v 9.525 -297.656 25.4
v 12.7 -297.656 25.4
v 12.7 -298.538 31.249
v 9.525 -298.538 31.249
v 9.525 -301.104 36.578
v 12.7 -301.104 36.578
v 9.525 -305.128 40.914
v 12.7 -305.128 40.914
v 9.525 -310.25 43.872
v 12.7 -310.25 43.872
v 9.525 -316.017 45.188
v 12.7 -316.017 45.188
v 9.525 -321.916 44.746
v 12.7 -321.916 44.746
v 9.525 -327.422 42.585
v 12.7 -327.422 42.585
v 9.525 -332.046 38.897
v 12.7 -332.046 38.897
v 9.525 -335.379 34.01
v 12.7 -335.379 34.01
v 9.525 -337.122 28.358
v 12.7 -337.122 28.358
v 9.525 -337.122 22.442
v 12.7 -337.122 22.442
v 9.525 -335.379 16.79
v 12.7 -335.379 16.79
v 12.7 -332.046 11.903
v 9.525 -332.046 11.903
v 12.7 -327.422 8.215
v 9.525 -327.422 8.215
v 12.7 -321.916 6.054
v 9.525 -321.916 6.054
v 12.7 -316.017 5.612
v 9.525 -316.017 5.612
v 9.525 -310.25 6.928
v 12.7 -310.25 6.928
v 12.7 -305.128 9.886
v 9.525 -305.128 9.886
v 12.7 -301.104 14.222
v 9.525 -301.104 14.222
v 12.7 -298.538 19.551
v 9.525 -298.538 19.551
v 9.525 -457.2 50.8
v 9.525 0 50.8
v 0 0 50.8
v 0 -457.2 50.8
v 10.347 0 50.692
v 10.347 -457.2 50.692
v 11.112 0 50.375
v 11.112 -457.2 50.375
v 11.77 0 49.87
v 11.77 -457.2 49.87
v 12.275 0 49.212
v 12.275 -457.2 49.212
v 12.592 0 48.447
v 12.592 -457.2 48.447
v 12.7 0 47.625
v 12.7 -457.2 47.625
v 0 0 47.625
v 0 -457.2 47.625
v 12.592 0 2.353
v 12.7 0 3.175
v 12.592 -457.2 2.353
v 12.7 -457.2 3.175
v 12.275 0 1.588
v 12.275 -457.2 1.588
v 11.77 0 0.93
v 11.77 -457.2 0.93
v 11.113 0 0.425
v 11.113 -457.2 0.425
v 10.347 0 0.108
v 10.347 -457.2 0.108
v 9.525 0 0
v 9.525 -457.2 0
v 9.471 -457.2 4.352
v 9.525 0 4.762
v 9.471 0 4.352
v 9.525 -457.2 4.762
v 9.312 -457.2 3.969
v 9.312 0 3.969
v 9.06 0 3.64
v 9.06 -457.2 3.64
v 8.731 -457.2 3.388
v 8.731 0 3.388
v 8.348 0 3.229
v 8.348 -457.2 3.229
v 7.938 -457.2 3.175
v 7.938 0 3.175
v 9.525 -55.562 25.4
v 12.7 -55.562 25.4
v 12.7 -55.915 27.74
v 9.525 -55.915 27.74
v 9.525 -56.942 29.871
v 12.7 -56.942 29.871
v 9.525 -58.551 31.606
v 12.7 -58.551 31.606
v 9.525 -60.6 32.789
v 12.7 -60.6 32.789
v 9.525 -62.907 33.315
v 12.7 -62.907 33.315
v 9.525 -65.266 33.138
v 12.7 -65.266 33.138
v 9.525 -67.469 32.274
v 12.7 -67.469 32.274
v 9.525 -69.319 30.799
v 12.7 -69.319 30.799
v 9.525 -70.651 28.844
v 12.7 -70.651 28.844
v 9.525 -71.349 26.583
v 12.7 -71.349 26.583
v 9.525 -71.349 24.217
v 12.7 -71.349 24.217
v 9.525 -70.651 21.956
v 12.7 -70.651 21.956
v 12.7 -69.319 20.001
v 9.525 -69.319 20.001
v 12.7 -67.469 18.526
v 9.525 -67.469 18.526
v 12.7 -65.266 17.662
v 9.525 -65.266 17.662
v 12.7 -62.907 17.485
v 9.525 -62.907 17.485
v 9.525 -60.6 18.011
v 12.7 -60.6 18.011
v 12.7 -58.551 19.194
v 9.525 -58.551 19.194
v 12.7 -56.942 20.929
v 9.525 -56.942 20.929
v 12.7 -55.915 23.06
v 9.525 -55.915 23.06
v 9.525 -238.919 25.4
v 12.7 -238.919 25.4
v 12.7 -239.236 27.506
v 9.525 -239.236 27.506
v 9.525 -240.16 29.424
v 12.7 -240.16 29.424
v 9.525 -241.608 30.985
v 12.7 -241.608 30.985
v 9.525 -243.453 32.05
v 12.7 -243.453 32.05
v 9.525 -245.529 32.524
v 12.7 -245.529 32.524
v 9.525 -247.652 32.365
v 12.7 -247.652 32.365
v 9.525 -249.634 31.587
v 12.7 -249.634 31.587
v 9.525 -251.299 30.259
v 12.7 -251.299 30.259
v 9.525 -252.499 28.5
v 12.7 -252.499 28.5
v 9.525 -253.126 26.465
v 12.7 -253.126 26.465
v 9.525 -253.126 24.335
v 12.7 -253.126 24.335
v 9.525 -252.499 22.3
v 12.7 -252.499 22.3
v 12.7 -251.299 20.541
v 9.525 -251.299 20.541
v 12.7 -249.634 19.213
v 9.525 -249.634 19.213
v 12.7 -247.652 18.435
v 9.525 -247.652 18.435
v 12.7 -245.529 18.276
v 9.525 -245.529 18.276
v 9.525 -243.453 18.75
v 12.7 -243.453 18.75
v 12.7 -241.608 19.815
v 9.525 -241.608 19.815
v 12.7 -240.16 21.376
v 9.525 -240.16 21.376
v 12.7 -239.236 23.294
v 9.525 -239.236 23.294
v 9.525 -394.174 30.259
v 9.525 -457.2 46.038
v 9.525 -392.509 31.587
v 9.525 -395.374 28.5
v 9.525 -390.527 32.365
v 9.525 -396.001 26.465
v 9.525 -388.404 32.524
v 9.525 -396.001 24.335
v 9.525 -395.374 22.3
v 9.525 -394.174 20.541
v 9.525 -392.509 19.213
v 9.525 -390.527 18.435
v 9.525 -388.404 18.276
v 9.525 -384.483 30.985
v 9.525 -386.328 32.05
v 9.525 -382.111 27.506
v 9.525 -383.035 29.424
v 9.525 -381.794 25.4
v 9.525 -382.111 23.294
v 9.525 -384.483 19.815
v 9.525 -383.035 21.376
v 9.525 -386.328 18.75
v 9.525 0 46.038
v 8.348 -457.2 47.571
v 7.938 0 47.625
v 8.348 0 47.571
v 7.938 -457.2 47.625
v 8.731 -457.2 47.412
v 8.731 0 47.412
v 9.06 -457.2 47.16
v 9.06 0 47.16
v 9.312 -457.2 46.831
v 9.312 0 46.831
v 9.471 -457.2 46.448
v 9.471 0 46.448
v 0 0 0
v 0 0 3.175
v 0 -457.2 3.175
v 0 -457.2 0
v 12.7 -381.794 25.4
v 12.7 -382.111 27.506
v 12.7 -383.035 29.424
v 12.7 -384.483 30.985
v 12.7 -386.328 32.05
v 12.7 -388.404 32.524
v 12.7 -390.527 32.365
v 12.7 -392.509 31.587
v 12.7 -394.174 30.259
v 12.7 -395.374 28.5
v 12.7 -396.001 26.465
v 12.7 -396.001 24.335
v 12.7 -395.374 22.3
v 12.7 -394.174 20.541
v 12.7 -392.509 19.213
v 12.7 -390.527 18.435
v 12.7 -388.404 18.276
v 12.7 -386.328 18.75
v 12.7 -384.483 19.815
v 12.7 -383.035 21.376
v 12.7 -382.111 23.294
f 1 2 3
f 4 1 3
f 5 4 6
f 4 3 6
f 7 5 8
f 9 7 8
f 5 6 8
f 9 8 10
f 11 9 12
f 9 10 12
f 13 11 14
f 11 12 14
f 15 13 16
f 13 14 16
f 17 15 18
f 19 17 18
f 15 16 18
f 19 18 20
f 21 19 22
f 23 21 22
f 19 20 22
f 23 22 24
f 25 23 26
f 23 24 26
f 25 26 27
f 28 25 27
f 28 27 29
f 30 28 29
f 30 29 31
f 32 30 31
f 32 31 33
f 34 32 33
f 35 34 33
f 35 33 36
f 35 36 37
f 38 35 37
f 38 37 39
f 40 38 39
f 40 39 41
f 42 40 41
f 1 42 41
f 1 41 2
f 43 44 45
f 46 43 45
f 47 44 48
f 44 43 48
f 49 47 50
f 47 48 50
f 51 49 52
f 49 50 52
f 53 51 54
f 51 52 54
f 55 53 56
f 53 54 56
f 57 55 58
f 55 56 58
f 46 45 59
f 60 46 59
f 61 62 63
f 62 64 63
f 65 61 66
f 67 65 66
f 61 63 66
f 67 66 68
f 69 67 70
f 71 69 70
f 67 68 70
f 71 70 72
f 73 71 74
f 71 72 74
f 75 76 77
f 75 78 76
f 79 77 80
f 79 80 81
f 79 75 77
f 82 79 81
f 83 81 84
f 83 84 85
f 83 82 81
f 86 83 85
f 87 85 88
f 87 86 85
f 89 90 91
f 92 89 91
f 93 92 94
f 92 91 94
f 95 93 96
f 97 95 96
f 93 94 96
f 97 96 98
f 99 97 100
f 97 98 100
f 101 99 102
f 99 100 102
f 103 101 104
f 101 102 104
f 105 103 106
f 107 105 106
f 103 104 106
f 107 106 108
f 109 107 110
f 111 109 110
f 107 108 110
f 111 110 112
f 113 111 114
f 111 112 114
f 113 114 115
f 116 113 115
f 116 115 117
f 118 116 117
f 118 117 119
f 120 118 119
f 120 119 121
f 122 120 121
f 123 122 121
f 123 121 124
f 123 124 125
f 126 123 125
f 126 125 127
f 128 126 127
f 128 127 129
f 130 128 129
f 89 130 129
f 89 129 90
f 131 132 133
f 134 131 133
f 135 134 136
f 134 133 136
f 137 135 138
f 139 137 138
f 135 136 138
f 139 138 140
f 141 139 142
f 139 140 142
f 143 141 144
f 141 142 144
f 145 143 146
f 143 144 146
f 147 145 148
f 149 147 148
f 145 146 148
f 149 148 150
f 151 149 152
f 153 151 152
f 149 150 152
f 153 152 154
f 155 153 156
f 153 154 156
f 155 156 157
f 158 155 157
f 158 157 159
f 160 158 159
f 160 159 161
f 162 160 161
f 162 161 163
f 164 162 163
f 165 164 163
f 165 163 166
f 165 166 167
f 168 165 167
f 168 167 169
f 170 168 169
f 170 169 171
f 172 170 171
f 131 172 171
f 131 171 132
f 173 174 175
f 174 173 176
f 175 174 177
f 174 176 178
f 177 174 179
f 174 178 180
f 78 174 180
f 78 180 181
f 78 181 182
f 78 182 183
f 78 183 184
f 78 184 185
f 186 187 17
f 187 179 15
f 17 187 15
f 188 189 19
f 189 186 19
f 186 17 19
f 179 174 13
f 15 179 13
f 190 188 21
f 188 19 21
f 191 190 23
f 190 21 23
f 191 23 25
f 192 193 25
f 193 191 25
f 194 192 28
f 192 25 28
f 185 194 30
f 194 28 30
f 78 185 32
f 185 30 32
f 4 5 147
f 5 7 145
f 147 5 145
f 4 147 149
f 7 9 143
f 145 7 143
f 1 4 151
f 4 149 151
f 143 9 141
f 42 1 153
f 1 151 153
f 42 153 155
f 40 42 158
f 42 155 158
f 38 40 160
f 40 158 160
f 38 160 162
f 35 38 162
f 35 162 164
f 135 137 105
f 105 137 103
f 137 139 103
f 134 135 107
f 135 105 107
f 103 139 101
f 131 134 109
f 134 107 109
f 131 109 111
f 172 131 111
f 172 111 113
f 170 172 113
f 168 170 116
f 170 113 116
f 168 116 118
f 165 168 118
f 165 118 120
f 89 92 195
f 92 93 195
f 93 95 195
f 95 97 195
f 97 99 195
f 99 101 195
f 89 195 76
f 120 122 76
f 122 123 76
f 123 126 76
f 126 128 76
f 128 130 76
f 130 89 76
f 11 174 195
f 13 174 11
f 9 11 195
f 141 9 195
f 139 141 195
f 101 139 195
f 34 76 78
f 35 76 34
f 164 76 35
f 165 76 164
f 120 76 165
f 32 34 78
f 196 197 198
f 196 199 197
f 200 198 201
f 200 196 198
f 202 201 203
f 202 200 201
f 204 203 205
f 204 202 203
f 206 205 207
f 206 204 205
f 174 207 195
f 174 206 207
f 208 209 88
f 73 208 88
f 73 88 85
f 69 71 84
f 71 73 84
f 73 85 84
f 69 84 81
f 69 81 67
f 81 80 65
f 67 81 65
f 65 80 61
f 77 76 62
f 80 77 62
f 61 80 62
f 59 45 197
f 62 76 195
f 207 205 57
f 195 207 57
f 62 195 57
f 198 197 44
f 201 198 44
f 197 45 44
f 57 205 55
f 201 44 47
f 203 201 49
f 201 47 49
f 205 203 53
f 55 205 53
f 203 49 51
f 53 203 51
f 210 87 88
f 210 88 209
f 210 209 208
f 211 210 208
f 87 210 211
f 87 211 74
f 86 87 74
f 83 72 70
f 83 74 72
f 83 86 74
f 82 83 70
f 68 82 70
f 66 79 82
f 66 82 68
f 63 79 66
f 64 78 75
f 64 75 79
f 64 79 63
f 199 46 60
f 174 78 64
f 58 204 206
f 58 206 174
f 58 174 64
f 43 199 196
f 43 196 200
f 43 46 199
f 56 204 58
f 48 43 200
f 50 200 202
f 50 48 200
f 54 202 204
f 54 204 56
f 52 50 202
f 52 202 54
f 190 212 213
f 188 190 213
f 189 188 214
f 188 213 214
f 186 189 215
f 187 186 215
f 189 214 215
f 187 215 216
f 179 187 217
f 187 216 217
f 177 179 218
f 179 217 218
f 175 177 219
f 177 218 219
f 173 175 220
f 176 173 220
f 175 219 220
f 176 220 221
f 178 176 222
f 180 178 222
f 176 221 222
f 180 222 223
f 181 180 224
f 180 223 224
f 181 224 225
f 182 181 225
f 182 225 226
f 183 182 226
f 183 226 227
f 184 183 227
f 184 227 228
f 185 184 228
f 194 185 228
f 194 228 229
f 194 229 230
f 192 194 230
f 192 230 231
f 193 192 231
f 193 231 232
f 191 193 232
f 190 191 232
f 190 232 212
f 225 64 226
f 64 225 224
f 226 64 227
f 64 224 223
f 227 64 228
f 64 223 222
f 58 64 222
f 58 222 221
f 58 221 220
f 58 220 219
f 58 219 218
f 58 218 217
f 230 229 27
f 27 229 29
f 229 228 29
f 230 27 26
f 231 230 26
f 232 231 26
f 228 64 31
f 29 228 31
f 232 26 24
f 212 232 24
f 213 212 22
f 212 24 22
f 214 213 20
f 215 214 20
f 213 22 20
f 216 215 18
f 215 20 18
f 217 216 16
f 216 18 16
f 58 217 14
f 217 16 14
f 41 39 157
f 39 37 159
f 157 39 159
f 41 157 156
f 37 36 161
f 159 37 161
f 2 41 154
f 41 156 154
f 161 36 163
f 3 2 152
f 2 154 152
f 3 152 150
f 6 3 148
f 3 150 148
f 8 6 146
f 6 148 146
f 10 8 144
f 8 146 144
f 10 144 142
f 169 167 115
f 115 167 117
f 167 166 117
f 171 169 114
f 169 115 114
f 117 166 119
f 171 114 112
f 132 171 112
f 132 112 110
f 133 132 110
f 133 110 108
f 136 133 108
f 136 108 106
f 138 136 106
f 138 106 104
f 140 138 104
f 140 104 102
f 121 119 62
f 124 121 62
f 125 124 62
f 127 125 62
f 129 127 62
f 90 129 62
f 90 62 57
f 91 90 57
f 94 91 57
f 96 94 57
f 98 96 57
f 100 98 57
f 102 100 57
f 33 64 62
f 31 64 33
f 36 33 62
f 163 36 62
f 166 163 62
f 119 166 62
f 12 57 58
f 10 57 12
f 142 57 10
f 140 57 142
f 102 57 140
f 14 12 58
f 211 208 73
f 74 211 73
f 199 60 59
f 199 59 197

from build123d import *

# Parameters (mm, degrees)
F1_DEPTH = 457.2
F2_R     = 1.5875
F3_R     = 3.175
F4_R     = 7.14375
F4_R_2   = 19.84375
F4_R_3   = 7.9375
F5_DEPTH = 25.4


with BuildPart() as f1:
    # F0 (on Front) → F1 (new body)
    with BuildSketch(Plane.XZ):
        Polygon((0, 3.175), (0, 0), (12.7, 0), (12.7, 50.8), (0, 50.8), (0, 47.625), (9.525, 47.625), (9.525, 3.175), align=None)
    extrude(amount=F1_DEPTH)

    # F2
    f2_edges = [f1.edges().sort_by_distance(p)[0] for p in [
        (9.525, -228.6, 3.175),
        (9.525, -228.6, 47.625),
    ]]
    fillet(f2_edges, radius=F2_R)

    # F3
    f3_edges = [f1.edges().sort_by_distance(p)[0] for p in [
        (12.7, -228.6, 0),
        (12.7, -228.6, 50.8),
    ]]
    fillet(f3_edges, radius=F3_R)

    # F4 (on face) → F5 (cut)
    with BuildSketch(Plane.YZ.offset(12.7)):
        with Locations((-388.9375, 25.4)):
            Circle(F4_R)
        with Locations((-246.0625, 25.4)):
            Circle(F4_R)
        with Locations((-317.5, 25.4)):
            Circle(F4_R_2)
        with Locations((-63.5, 25.4)):
            Circle(F4_R_3)
    extrude(amount=-F5_DEPTH, mode=Mode.SUBTRACT)


solid = f1.part
